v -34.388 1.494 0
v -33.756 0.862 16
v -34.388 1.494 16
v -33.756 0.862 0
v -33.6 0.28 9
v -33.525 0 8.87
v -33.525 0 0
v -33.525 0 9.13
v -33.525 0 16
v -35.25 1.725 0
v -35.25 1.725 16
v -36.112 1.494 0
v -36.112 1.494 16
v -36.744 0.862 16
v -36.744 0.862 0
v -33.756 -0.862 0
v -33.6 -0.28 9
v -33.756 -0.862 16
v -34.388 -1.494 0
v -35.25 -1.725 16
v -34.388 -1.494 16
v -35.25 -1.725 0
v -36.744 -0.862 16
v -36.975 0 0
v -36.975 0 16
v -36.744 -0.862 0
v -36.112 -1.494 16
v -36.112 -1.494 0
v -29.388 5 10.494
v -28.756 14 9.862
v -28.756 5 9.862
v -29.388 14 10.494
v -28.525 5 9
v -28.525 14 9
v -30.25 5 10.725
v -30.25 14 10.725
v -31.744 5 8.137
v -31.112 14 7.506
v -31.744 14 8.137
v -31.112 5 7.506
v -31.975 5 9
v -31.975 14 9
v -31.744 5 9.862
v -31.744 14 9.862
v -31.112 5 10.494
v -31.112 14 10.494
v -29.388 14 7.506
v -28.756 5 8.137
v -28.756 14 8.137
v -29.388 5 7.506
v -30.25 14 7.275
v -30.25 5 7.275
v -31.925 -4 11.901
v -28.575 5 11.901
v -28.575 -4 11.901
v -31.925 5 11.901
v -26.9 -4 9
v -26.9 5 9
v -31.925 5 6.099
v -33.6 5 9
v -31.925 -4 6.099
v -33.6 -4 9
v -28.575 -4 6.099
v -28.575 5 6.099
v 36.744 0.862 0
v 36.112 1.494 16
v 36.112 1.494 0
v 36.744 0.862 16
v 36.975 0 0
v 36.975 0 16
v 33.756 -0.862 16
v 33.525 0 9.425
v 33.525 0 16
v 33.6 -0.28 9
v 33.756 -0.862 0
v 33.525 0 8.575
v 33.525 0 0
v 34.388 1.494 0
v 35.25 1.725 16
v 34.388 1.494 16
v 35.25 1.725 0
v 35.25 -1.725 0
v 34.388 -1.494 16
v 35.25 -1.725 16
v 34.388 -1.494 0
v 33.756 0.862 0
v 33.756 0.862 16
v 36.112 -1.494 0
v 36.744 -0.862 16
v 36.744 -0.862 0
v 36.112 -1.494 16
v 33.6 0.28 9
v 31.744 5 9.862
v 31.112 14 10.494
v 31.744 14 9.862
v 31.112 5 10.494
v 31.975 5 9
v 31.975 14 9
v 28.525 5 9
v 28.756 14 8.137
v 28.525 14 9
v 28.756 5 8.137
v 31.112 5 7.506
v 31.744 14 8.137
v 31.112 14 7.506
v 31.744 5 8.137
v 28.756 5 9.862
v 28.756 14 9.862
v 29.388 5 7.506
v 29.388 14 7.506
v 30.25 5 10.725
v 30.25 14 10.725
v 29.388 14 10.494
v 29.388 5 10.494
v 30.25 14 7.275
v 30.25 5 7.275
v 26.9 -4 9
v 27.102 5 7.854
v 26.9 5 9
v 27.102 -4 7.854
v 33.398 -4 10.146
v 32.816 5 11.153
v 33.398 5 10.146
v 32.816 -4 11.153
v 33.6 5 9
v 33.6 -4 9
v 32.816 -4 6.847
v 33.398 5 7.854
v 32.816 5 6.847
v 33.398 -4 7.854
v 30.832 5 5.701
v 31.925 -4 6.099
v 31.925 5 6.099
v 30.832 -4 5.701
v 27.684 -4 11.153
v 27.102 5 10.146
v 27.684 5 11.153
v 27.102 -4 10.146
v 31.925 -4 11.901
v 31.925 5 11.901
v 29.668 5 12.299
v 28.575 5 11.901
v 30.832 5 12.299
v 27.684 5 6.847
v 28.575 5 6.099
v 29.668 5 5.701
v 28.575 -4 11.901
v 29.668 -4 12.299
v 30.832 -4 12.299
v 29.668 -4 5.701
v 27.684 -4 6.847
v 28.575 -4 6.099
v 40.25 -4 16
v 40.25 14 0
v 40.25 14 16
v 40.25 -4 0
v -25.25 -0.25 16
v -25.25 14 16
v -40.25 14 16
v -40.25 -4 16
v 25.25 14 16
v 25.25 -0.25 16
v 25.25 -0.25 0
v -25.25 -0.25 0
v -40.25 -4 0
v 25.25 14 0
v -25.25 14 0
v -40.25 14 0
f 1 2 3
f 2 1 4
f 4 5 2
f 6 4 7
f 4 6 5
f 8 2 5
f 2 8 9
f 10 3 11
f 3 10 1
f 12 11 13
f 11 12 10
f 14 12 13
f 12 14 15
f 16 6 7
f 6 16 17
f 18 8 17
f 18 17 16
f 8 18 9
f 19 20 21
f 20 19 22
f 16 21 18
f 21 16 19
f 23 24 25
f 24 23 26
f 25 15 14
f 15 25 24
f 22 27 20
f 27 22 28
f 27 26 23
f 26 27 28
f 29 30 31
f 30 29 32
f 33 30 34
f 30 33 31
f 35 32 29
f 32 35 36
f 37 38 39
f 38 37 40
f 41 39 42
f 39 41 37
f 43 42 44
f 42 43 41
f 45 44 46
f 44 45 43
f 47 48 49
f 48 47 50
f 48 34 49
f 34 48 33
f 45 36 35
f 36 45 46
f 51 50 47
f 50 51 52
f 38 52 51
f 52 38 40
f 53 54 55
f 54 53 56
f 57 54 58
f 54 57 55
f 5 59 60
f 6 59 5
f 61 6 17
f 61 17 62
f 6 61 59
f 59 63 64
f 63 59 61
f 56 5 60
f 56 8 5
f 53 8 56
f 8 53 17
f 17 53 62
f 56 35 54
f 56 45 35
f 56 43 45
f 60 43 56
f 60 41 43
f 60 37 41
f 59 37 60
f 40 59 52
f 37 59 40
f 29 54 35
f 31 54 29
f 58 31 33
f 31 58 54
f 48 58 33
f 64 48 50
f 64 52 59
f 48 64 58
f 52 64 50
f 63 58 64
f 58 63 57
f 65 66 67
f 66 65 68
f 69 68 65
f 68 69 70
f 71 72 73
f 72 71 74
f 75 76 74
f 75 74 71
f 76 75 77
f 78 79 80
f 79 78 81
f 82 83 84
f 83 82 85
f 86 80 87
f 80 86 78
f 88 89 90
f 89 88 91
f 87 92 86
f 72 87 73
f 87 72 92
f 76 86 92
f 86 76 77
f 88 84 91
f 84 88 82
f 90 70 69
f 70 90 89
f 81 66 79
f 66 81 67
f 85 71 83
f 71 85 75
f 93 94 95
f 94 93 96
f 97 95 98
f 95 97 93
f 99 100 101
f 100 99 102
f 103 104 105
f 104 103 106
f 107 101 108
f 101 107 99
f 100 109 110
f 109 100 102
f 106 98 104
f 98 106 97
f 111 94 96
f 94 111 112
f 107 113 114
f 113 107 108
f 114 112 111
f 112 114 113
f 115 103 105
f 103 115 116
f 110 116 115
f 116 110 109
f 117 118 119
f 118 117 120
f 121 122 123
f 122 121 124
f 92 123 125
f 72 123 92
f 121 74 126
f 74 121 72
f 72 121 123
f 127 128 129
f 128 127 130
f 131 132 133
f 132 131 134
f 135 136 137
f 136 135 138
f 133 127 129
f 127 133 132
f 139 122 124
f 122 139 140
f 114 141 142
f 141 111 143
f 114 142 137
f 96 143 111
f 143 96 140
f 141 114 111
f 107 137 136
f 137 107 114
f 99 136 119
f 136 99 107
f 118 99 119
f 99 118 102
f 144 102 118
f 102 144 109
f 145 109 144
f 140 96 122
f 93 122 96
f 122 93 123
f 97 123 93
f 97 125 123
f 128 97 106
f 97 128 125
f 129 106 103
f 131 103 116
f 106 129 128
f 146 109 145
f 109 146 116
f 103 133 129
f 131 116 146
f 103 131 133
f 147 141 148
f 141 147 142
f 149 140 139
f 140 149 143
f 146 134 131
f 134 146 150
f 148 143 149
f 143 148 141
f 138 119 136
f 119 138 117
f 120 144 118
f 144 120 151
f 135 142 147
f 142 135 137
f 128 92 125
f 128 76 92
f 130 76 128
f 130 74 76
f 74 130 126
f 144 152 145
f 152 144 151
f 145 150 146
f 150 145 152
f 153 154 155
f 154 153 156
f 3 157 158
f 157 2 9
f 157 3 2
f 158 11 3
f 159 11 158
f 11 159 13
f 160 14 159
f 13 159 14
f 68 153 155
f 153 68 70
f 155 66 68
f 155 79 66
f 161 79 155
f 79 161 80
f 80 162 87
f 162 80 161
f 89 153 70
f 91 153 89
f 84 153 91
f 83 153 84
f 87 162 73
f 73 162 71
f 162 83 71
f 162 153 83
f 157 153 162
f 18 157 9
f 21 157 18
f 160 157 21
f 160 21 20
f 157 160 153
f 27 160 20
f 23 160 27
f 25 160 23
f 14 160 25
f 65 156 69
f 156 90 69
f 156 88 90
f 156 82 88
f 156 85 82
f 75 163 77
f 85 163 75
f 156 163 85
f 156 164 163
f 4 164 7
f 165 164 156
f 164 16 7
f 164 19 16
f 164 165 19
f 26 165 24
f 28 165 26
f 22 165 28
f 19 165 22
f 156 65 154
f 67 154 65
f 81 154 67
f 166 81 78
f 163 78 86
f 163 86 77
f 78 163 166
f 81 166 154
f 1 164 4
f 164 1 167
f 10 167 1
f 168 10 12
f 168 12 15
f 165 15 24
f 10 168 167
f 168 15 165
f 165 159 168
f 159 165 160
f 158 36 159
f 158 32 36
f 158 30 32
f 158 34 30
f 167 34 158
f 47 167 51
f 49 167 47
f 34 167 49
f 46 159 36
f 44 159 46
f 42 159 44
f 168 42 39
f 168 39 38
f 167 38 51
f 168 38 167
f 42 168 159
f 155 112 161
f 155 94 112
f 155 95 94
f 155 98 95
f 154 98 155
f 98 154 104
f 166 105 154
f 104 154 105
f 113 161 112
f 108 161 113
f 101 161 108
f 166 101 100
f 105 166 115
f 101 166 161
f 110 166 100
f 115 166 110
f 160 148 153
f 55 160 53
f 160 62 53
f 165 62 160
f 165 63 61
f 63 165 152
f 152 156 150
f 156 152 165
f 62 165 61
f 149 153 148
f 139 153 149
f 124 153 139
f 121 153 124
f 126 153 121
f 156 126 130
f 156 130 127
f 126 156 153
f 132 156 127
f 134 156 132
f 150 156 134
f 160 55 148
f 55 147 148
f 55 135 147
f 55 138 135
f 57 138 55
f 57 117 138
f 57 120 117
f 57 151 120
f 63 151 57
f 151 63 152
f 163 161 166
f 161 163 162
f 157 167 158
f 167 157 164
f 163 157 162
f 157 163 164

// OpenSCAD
// file: configuration.scad
// Increase this if your slicer or printer make holes too tight.
extra_radius = 0.1;

// OD = outside diameter, corner to corner.
m3_nut_od = 6.1;
m3_nut_radius = m3_nut_od/2 + 0.2 + extra_radius;
m3_washer_radius = 3.5 + extra_radius;

// Major diameter of metric 3mm thread.
m3_major = 2.85;
m3_radius = m3_major/2 + extra_radius;
m3_wide_radius = m3_major/2 + extra_radius + 0.2;

// NEMA17 stepper motors.
motor_shaft_diameter = 5;
motor_shaft_radius = motor_shaft_diameter/2 + extra_radius;

// Frame brackets. M3x8mm screws work best with 3.6 mm brackets.
thickness = 3.6;

// OpenBeam or Misumi. Currently only 15x15 mm, but there is a plan
// to make models more parametric and allow 20x20 mm in the future.
extrusion = 15;

// Placement for the NEMA17 stepper motors.
motor_offset = 44;
motor_length = 47;
// main file
include <configuration.scad>;

space = 15;  // Between horizontal OpenBeam pieces.

power_supply_height = 30.5;
power_supply_width = 50.5;

module power_supply() {
  difference() {
    translate([0, 5, 8])
      cube([power_supply_width+30, 18, 16],
        center=true);
    // Power supply body.
    translate([0, 7.5+space/2, 0])
      cube([power_supply_width, power_supply_height, 100], center=true);
    // Screw holes.
    for (x = [-1, 1]) {
      translate([x*(power_supply_width/2+10), 0, 9])
        cylinder(r=m3_wide_radius, h=40, center=true, $fn=12);
      translate([x*(power_supply_width/2+5), 20, 9]) rotate([90, 0, 0])
        cylinder(r=m3_wide_radius, h=40, center=true, $fn=12);
      translate([x*(power_supply_width/2+5), 5, 9]) rotate([90, 0, 0])
        cylinder(r=m3_nut_radius, h=40, $fn=12+x*6);
    }
  }
}

power_supply();
% translate([0, space+15, 0]) rotate([0, 0, 180]) power_supply();
